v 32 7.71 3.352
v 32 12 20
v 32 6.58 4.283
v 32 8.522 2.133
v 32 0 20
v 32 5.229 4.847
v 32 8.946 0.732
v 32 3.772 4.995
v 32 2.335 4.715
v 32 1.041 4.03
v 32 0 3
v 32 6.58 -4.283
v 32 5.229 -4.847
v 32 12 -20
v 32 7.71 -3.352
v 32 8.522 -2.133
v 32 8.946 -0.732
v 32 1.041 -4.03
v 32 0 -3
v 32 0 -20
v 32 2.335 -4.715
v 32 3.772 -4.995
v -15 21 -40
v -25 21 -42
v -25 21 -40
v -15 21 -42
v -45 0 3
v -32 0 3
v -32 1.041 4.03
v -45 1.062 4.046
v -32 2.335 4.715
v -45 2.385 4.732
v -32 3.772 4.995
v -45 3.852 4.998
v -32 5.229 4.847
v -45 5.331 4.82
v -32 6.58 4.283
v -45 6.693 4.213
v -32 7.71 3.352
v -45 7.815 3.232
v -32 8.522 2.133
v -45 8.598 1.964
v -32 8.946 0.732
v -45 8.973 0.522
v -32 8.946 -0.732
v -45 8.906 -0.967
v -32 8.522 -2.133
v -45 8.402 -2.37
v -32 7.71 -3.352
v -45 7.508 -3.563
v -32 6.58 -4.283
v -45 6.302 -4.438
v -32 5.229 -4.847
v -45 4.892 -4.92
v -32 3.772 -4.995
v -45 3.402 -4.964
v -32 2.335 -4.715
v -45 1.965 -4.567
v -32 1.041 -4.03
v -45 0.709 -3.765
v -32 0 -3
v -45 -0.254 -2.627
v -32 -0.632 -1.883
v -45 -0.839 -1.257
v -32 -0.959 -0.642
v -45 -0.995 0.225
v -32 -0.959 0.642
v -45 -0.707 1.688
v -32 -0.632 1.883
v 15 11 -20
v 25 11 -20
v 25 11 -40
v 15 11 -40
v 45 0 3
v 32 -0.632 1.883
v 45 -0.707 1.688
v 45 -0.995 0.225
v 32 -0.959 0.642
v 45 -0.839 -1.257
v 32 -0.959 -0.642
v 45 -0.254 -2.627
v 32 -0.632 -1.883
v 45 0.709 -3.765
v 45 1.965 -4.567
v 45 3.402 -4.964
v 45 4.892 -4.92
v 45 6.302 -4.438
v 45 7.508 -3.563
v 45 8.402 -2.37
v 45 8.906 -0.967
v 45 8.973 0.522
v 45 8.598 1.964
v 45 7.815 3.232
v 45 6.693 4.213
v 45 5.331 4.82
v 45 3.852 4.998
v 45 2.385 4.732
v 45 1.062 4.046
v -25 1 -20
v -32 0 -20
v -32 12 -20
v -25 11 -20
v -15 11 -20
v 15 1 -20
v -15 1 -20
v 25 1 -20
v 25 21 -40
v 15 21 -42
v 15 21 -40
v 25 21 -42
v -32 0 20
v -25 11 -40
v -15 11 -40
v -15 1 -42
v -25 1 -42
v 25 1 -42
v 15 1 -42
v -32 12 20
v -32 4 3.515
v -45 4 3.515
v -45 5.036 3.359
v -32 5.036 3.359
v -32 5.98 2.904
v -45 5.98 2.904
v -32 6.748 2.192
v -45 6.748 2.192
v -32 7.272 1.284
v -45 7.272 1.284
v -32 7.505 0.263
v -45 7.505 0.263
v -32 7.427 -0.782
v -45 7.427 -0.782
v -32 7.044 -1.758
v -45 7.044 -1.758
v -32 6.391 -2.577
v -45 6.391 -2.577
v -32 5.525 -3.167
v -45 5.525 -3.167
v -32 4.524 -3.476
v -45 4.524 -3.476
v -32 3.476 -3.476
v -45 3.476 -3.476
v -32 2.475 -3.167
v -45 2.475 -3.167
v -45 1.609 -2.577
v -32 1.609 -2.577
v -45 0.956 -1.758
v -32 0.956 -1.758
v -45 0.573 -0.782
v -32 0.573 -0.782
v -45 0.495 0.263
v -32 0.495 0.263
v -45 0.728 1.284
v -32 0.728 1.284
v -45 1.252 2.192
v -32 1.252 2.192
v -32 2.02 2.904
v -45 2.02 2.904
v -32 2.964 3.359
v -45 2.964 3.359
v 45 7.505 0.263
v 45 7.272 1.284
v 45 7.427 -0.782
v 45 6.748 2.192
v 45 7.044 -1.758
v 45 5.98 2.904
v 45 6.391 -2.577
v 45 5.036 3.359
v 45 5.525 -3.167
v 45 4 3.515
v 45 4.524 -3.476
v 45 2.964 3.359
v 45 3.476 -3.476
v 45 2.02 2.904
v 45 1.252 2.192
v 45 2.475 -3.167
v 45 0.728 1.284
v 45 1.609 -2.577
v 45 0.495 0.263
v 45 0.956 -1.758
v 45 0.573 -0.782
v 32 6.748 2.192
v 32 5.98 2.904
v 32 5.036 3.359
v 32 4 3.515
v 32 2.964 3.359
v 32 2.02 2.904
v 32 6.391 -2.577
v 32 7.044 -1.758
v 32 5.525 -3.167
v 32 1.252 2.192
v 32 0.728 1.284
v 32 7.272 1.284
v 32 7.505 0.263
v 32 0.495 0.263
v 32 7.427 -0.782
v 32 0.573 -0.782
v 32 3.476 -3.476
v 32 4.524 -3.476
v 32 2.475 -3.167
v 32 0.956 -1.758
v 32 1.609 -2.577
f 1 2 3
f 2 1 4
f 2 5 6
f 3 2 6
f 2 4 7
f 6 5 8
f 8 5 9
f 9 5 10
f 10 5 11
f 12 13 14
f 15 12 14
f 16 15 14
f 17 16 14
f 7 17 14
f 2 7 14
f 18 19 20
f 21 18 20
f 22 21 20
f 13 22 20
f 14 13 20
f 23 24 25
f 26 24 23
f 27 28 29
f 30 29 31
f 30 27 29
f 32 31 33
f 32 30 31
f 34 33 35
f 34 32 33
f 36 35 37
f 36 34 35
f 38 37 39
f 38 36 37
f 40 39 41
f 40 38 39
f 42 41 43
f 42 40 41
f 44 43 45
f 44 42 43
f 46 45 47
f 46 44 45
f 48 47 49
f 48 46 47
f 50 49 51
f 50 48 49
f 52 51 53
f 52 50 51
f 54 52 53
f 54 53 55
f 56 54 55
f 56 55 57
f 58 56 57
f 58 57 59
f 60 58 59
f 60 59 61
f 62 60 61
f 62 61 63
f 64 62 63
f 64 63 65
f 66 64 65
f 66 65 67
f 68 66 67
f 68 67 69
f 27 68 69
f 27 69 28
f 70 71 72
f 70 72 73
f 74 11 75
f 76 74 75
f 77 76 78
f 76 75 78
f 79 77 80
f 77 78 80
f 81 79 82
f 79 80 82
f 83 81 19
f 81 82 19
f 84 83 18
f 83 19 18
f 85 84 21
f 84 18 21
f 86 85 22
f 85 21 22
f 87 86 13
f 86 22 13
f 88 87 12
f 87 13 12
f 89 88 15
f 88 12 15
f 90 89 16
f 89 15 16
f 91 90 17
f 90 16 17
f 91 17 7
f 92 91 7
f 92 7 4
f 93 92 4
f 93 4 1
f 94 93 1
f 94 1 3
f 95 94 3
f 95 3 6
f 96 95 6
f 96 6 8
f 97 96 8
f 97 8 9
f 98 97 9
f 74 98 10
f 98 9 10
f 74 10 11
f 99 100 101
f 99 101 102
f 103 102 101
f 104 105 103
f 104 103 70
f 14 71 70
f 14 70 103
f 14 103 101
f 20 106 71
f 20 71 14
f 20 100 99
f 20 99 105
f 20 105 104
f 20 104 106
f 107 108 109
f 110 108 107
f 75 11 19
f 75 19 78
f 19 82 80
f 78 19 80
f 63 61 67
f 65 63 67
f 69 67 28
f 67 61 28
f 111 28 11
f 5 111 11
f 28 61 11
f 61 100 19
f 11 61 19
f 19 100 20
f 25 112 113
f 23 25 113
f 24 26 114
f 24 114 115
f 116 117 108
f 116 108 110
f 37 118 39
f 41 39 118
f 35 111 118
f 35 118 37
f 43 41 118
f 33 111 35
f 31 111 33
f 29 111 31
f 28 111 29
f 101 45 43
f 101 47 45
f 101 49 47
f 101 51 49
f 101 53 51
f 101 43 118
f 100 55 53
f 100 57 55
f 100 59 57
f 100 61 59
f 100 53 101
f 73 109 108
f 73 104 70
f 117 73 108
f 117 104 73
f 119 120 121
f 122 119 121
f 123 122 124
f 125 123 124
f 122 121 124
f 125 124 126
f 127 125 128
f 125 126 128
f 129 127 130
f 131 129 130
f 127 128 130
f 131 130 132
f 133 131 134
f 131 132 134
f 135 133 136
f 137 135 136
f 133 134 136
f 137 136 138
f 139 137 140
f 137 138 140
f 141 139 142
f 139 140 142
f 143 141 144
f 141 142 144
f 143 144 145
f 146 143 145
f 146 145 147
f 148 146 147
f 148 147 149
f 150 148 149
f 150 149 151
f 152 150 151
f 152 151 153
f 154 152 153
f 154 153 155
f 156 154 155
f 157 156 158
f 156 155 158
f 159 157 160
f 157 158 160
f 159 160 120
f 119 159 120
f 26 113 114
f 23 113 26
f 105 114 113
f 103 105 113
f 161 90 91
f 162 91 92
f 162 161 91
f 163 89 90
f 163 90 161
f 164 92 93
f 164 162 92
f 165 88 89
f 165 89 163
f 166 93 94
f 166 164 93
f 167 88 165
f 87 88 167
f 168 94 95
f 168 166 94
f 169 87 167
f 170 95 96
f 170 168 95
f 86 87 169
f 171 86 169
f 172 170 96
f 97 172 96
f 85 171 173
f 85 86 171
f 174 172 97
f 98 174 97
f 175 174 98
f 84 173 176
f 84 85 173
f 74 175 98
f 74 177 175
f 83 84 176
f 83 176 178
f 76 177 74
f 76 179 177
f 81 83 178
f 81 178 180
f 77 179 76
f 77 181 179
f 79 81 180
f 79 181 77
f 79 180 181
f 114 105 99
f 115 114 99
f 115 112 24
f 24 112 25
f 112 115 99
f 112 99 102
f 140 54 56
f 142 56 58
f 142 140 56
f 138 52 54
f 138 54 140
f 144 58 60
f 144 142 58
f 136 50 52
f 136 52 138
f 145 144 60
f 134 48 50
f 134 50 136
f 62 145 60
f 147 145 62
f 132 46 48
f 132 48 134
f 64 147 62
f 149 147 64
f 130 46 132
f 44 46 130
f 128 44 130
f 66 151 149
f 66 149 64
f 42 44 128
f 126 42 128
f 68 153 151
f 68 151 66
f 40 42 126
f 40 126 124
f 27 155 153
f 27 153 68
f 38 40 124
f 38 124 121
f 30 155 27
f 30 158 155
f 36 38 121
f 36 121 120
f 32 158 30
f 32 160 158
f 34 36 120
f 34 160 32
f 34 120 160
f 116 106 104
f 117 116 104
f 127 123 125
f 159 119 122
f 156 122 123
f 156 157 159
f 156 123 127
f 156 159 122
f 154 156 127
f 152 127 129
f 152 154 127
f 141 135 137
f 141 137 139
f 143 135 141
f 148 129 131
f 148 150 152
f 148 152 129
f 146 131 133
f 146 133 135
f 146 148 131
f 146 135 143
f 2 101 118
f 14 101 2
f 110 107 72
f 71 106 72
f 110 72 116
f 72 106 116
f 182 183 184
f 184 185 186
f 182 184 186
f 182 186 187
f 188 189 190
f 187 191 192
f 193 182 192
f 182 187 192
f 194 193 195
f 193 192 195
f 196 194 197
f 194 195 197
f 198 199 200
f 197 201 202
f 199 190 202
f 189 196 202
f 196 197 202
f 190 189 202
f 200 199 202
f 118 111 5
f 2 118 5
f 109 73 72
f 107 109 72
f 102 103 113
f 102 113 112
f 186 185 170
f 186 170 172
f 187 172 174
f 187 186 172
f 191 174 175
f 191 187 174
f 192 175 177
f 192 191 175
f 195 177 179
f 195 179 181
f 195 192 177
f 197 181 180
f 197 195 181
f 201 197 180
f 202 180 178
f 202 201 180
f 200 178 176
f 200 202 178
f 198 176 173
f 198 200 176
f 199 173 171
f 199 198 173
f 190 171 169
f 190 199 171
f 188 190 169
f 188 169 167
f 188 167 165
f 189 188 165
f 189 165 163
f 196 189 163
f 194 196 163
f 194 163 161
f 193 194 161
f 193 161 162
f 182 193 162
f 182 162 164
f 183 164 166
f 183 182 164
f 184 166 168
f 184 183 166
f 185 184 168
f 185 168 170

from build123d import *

# Parameters (mm, degrees)
SKETCH1_W           = 64
SKETCH1_H           = 40
BOSS_EXTRUDE1_DEPTH = 12
SKETCH2_R           = 5
SKETCH2_R_2         = 3.515
BOSS_EXTRUDE2_DEPTH = 13
BOSS_EXTRUDE3_START = 13
SKETCH3_R           = 5
SKETCH3_R_2         = 3.515
BOSS_EXTRUDE3_DEPTH = 13
SKETCH5_W           = 10
SKETCH5_H           = 10
BOSS_EXTRUDE4_DEPTH = 22
SKETCH6_W           = 10
SKETCH6_H           = 2
BOSS_EXTRUDE5_DEPTH = 10


with BuildPart() as part:
    # Sketch1 → Boss-Extrude1 (new body)
    with BuildSketch(Plane(origin=(0, 0, 0), x_dir=(1, 0, 0), z_dir=(0, 1, 0))):
        Rectangle(SKETCH1_W, SKETCH1_H)
    extrude(amount=BOSS_EXTRUDE1_DEPTH)

    # Sketch2 → Boss-Extrude2 (add)
    with BuildSketch(Plane(origin=(32, 0, 0), x_dir=(0, 0, -1), z_dir=(1, 0, 0))):
        with Locations(Location((0, 4, 0), (0, 0, 233.130102354))):
            Circle(SKETCH2_R)
        with Locations(Location((0, 4, 0), (0, 0, 180))):
            Circle(SKETCH2_R_2, mode=Mode.SUBTRACT)
    extrude(amount=BOSS_EXTRUDE2_DEPTH)

    # Sketch3 → Boss-Extrude3 (add)
    with BuildSketch(Plane.ZY.offset(32).offset(BOSS_EXTRUDE3_START)):
        with Locations(Location((0, 4, 0), (0, 0, 306.869897646))):
            Circle(SKETCH3_R)
        with Locations((0, 4)):
            Circle(SKETCH3_R_2, mode=Mode.SUBTRACT)
    extrude(amount=-BOSS_EXTRUDE3_DEPTH)

    # Sketch5 → Boss-Extrude4 (add)
    with BuildSketch(Plane(origin=(0, 0, -20), x_dir=(-1, 0, 0), z_dir=(0, 0, -1))):
        with Locations((-20, 6)):
            Rectangle(SKETCH5_W, SKETCH5_H)
        with Locations((20, 6)):
            Rectangle(SKETCH5_W, SKETCH5_H)
    extrude(amount=BOSS_EXTRUDE4_DEPTH)

    # Sketch6 → Boss-Extrude5 (add)
    with BuildSketch(Plane(origin=(0, 11, 0), x_dir=(1, 0, 0), z_dir=(0, 1, 0))):
        with Locations((20, 41)):
            Rectangle(SKETCH6_W, SKETCH6_H)
        with Locations((-20, 41)):
            Rectangle(SKETCH6_W, SKETCH6_H)
    extrude(amount=BOSS_EXTRUDE5_DEPTH)


solid = part.part
